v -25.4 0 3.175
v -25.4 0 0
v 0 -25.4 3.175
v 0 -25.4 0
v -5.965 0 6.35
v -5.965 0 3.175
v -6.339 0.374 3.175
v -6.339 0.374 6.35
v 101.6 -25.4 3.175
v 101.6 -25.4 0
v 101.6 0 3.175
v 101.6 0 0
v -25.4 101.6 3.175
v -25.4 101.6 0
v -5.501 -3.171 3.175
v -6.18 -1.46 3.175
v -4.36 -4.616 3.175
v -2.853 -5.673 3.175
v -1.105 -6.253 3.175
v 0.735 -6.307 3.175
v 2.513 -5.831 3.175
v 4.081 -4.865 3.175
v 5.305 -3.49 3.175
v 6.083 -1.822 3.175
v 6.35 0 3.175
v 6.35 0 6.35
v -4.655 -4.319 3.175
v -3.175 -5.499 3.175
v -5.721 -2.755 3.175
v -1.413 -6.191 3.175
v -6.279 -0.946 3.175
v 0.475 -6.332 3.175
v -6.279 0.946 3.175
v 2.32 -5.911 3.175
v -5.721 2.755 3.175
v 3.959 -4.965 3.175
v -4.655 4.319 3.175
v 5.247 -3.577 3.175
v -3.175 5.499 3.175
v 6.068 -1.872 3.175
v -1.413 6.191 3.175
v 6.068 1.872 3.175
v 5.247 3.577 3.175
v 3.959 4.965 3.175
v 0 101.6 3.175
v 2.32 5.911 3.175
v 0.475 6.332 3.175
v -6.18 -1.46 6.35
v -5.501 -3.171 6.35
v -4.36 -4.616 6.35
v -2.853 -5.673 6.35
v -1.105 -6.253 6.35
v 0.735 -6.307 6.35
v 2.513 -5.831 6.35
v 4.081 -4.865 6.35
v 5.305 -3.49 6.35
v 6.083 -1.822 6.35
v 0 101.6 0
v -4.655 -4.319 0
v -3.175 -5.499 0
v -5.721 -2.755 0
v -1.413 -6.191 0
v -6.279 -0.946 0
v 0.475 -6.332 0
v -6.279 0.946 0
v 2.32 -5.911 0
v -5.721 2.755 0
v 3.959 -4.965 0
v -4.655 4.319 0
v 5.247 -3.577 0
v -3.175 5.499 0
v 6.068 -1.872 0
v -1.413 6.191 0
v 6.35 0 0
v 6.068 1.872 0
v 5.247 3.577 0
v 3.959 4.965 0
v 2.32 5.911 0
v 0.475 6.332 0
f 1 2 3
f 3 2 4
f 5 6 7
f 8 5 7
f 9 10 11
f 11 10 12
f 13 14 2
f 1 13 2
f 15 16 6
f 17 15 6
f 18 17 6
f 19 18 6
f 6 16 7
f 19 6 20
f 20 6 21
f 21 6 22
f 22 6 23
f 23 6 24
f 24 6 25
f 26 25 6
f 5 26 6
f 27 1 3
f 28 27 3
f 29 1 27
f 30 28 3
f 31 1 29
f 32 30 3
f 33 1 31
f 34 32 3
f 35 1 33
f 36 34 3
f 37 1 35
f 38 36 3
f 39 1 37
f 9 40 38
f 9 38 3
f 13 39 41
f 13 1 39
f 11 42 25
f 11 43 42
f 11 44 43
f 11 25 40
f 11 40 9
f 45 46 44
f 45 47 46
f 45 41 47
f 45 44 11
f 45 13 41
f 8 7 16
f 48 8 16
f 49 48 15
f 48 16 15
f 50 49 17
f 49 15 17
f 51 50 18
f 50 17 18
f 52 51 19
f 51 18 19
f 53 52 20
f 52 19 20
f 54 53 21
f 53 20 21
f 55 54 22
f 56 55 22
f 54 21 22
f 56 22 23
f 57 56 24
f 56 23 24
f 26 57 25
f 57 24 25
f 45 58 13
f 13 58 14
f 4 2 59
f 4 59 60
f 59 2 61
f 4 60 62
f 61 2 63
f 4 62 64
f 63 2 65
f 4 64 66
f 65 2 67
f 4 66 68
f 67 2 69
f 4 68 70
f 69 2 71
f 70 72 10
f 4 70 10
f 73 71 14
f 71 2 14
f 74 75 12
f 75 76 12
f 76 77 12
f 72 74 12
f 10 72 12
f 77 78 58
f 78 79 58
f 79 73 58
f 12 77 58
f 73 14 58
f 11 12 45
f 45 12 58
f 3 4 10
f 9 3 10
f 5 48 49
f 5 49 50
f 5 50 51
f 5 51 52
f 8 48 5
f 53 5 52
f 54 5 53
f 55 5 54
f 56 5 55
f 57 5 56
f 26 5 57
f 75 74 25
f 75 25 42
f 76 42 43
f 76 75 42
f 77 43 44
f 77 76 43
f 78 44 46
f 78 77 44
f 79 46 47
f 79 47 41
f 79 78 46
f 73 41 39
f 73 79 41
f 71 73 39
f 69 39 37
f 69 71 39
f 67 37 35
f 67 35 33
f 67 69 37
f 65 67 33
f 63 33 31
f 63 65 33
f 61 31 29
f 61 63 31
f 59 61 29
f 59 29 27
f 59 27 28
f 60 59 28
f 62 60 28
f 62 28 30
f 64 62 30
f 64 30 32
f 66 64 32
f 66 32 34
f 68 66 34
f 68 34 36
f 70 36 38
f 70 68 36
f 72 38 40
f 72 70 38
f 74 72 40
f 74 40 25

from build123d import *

# Parameters (mm, degrees)
F0_R     = 6.35
F1_DEPTH = 3.175
F3_DEPTH = 3.175


with BuildPart() as f1:
    # F0 (on Top) → F1 (new body)
    with BuildSketch(Plane.XY):
        Polygon((-25.4, 101.6), (-25.4, 0), (0, -25.4), (101.6, -25.4), (101.6, -12.7), (101.6, 0), (0, 101.6), align=None)
        Circle(F0_R, mode=Mode.SUBTRACT)
    extrude(amount=F1_DEPTH)


with BuildPart() as f3:
    # F2 (on face) → F3 (new body)
    with BuildSketch(Plane.XY.offset(3.175)):
        with BuildLine():
            ThreePointArc((-6.3389671749, 0.3741592657), (-0.1871609463, -6.3472411944), (6.35, 0))
            Line((6.35, 0), (-5.9648079092, 0))
            Line((-5.9648079092, 0), (-6.3389671749, 0.3741592657))
        make_face()
    extrude(amount=F3_DEPTH)


solid = Compound([f1.part, f3.part])
